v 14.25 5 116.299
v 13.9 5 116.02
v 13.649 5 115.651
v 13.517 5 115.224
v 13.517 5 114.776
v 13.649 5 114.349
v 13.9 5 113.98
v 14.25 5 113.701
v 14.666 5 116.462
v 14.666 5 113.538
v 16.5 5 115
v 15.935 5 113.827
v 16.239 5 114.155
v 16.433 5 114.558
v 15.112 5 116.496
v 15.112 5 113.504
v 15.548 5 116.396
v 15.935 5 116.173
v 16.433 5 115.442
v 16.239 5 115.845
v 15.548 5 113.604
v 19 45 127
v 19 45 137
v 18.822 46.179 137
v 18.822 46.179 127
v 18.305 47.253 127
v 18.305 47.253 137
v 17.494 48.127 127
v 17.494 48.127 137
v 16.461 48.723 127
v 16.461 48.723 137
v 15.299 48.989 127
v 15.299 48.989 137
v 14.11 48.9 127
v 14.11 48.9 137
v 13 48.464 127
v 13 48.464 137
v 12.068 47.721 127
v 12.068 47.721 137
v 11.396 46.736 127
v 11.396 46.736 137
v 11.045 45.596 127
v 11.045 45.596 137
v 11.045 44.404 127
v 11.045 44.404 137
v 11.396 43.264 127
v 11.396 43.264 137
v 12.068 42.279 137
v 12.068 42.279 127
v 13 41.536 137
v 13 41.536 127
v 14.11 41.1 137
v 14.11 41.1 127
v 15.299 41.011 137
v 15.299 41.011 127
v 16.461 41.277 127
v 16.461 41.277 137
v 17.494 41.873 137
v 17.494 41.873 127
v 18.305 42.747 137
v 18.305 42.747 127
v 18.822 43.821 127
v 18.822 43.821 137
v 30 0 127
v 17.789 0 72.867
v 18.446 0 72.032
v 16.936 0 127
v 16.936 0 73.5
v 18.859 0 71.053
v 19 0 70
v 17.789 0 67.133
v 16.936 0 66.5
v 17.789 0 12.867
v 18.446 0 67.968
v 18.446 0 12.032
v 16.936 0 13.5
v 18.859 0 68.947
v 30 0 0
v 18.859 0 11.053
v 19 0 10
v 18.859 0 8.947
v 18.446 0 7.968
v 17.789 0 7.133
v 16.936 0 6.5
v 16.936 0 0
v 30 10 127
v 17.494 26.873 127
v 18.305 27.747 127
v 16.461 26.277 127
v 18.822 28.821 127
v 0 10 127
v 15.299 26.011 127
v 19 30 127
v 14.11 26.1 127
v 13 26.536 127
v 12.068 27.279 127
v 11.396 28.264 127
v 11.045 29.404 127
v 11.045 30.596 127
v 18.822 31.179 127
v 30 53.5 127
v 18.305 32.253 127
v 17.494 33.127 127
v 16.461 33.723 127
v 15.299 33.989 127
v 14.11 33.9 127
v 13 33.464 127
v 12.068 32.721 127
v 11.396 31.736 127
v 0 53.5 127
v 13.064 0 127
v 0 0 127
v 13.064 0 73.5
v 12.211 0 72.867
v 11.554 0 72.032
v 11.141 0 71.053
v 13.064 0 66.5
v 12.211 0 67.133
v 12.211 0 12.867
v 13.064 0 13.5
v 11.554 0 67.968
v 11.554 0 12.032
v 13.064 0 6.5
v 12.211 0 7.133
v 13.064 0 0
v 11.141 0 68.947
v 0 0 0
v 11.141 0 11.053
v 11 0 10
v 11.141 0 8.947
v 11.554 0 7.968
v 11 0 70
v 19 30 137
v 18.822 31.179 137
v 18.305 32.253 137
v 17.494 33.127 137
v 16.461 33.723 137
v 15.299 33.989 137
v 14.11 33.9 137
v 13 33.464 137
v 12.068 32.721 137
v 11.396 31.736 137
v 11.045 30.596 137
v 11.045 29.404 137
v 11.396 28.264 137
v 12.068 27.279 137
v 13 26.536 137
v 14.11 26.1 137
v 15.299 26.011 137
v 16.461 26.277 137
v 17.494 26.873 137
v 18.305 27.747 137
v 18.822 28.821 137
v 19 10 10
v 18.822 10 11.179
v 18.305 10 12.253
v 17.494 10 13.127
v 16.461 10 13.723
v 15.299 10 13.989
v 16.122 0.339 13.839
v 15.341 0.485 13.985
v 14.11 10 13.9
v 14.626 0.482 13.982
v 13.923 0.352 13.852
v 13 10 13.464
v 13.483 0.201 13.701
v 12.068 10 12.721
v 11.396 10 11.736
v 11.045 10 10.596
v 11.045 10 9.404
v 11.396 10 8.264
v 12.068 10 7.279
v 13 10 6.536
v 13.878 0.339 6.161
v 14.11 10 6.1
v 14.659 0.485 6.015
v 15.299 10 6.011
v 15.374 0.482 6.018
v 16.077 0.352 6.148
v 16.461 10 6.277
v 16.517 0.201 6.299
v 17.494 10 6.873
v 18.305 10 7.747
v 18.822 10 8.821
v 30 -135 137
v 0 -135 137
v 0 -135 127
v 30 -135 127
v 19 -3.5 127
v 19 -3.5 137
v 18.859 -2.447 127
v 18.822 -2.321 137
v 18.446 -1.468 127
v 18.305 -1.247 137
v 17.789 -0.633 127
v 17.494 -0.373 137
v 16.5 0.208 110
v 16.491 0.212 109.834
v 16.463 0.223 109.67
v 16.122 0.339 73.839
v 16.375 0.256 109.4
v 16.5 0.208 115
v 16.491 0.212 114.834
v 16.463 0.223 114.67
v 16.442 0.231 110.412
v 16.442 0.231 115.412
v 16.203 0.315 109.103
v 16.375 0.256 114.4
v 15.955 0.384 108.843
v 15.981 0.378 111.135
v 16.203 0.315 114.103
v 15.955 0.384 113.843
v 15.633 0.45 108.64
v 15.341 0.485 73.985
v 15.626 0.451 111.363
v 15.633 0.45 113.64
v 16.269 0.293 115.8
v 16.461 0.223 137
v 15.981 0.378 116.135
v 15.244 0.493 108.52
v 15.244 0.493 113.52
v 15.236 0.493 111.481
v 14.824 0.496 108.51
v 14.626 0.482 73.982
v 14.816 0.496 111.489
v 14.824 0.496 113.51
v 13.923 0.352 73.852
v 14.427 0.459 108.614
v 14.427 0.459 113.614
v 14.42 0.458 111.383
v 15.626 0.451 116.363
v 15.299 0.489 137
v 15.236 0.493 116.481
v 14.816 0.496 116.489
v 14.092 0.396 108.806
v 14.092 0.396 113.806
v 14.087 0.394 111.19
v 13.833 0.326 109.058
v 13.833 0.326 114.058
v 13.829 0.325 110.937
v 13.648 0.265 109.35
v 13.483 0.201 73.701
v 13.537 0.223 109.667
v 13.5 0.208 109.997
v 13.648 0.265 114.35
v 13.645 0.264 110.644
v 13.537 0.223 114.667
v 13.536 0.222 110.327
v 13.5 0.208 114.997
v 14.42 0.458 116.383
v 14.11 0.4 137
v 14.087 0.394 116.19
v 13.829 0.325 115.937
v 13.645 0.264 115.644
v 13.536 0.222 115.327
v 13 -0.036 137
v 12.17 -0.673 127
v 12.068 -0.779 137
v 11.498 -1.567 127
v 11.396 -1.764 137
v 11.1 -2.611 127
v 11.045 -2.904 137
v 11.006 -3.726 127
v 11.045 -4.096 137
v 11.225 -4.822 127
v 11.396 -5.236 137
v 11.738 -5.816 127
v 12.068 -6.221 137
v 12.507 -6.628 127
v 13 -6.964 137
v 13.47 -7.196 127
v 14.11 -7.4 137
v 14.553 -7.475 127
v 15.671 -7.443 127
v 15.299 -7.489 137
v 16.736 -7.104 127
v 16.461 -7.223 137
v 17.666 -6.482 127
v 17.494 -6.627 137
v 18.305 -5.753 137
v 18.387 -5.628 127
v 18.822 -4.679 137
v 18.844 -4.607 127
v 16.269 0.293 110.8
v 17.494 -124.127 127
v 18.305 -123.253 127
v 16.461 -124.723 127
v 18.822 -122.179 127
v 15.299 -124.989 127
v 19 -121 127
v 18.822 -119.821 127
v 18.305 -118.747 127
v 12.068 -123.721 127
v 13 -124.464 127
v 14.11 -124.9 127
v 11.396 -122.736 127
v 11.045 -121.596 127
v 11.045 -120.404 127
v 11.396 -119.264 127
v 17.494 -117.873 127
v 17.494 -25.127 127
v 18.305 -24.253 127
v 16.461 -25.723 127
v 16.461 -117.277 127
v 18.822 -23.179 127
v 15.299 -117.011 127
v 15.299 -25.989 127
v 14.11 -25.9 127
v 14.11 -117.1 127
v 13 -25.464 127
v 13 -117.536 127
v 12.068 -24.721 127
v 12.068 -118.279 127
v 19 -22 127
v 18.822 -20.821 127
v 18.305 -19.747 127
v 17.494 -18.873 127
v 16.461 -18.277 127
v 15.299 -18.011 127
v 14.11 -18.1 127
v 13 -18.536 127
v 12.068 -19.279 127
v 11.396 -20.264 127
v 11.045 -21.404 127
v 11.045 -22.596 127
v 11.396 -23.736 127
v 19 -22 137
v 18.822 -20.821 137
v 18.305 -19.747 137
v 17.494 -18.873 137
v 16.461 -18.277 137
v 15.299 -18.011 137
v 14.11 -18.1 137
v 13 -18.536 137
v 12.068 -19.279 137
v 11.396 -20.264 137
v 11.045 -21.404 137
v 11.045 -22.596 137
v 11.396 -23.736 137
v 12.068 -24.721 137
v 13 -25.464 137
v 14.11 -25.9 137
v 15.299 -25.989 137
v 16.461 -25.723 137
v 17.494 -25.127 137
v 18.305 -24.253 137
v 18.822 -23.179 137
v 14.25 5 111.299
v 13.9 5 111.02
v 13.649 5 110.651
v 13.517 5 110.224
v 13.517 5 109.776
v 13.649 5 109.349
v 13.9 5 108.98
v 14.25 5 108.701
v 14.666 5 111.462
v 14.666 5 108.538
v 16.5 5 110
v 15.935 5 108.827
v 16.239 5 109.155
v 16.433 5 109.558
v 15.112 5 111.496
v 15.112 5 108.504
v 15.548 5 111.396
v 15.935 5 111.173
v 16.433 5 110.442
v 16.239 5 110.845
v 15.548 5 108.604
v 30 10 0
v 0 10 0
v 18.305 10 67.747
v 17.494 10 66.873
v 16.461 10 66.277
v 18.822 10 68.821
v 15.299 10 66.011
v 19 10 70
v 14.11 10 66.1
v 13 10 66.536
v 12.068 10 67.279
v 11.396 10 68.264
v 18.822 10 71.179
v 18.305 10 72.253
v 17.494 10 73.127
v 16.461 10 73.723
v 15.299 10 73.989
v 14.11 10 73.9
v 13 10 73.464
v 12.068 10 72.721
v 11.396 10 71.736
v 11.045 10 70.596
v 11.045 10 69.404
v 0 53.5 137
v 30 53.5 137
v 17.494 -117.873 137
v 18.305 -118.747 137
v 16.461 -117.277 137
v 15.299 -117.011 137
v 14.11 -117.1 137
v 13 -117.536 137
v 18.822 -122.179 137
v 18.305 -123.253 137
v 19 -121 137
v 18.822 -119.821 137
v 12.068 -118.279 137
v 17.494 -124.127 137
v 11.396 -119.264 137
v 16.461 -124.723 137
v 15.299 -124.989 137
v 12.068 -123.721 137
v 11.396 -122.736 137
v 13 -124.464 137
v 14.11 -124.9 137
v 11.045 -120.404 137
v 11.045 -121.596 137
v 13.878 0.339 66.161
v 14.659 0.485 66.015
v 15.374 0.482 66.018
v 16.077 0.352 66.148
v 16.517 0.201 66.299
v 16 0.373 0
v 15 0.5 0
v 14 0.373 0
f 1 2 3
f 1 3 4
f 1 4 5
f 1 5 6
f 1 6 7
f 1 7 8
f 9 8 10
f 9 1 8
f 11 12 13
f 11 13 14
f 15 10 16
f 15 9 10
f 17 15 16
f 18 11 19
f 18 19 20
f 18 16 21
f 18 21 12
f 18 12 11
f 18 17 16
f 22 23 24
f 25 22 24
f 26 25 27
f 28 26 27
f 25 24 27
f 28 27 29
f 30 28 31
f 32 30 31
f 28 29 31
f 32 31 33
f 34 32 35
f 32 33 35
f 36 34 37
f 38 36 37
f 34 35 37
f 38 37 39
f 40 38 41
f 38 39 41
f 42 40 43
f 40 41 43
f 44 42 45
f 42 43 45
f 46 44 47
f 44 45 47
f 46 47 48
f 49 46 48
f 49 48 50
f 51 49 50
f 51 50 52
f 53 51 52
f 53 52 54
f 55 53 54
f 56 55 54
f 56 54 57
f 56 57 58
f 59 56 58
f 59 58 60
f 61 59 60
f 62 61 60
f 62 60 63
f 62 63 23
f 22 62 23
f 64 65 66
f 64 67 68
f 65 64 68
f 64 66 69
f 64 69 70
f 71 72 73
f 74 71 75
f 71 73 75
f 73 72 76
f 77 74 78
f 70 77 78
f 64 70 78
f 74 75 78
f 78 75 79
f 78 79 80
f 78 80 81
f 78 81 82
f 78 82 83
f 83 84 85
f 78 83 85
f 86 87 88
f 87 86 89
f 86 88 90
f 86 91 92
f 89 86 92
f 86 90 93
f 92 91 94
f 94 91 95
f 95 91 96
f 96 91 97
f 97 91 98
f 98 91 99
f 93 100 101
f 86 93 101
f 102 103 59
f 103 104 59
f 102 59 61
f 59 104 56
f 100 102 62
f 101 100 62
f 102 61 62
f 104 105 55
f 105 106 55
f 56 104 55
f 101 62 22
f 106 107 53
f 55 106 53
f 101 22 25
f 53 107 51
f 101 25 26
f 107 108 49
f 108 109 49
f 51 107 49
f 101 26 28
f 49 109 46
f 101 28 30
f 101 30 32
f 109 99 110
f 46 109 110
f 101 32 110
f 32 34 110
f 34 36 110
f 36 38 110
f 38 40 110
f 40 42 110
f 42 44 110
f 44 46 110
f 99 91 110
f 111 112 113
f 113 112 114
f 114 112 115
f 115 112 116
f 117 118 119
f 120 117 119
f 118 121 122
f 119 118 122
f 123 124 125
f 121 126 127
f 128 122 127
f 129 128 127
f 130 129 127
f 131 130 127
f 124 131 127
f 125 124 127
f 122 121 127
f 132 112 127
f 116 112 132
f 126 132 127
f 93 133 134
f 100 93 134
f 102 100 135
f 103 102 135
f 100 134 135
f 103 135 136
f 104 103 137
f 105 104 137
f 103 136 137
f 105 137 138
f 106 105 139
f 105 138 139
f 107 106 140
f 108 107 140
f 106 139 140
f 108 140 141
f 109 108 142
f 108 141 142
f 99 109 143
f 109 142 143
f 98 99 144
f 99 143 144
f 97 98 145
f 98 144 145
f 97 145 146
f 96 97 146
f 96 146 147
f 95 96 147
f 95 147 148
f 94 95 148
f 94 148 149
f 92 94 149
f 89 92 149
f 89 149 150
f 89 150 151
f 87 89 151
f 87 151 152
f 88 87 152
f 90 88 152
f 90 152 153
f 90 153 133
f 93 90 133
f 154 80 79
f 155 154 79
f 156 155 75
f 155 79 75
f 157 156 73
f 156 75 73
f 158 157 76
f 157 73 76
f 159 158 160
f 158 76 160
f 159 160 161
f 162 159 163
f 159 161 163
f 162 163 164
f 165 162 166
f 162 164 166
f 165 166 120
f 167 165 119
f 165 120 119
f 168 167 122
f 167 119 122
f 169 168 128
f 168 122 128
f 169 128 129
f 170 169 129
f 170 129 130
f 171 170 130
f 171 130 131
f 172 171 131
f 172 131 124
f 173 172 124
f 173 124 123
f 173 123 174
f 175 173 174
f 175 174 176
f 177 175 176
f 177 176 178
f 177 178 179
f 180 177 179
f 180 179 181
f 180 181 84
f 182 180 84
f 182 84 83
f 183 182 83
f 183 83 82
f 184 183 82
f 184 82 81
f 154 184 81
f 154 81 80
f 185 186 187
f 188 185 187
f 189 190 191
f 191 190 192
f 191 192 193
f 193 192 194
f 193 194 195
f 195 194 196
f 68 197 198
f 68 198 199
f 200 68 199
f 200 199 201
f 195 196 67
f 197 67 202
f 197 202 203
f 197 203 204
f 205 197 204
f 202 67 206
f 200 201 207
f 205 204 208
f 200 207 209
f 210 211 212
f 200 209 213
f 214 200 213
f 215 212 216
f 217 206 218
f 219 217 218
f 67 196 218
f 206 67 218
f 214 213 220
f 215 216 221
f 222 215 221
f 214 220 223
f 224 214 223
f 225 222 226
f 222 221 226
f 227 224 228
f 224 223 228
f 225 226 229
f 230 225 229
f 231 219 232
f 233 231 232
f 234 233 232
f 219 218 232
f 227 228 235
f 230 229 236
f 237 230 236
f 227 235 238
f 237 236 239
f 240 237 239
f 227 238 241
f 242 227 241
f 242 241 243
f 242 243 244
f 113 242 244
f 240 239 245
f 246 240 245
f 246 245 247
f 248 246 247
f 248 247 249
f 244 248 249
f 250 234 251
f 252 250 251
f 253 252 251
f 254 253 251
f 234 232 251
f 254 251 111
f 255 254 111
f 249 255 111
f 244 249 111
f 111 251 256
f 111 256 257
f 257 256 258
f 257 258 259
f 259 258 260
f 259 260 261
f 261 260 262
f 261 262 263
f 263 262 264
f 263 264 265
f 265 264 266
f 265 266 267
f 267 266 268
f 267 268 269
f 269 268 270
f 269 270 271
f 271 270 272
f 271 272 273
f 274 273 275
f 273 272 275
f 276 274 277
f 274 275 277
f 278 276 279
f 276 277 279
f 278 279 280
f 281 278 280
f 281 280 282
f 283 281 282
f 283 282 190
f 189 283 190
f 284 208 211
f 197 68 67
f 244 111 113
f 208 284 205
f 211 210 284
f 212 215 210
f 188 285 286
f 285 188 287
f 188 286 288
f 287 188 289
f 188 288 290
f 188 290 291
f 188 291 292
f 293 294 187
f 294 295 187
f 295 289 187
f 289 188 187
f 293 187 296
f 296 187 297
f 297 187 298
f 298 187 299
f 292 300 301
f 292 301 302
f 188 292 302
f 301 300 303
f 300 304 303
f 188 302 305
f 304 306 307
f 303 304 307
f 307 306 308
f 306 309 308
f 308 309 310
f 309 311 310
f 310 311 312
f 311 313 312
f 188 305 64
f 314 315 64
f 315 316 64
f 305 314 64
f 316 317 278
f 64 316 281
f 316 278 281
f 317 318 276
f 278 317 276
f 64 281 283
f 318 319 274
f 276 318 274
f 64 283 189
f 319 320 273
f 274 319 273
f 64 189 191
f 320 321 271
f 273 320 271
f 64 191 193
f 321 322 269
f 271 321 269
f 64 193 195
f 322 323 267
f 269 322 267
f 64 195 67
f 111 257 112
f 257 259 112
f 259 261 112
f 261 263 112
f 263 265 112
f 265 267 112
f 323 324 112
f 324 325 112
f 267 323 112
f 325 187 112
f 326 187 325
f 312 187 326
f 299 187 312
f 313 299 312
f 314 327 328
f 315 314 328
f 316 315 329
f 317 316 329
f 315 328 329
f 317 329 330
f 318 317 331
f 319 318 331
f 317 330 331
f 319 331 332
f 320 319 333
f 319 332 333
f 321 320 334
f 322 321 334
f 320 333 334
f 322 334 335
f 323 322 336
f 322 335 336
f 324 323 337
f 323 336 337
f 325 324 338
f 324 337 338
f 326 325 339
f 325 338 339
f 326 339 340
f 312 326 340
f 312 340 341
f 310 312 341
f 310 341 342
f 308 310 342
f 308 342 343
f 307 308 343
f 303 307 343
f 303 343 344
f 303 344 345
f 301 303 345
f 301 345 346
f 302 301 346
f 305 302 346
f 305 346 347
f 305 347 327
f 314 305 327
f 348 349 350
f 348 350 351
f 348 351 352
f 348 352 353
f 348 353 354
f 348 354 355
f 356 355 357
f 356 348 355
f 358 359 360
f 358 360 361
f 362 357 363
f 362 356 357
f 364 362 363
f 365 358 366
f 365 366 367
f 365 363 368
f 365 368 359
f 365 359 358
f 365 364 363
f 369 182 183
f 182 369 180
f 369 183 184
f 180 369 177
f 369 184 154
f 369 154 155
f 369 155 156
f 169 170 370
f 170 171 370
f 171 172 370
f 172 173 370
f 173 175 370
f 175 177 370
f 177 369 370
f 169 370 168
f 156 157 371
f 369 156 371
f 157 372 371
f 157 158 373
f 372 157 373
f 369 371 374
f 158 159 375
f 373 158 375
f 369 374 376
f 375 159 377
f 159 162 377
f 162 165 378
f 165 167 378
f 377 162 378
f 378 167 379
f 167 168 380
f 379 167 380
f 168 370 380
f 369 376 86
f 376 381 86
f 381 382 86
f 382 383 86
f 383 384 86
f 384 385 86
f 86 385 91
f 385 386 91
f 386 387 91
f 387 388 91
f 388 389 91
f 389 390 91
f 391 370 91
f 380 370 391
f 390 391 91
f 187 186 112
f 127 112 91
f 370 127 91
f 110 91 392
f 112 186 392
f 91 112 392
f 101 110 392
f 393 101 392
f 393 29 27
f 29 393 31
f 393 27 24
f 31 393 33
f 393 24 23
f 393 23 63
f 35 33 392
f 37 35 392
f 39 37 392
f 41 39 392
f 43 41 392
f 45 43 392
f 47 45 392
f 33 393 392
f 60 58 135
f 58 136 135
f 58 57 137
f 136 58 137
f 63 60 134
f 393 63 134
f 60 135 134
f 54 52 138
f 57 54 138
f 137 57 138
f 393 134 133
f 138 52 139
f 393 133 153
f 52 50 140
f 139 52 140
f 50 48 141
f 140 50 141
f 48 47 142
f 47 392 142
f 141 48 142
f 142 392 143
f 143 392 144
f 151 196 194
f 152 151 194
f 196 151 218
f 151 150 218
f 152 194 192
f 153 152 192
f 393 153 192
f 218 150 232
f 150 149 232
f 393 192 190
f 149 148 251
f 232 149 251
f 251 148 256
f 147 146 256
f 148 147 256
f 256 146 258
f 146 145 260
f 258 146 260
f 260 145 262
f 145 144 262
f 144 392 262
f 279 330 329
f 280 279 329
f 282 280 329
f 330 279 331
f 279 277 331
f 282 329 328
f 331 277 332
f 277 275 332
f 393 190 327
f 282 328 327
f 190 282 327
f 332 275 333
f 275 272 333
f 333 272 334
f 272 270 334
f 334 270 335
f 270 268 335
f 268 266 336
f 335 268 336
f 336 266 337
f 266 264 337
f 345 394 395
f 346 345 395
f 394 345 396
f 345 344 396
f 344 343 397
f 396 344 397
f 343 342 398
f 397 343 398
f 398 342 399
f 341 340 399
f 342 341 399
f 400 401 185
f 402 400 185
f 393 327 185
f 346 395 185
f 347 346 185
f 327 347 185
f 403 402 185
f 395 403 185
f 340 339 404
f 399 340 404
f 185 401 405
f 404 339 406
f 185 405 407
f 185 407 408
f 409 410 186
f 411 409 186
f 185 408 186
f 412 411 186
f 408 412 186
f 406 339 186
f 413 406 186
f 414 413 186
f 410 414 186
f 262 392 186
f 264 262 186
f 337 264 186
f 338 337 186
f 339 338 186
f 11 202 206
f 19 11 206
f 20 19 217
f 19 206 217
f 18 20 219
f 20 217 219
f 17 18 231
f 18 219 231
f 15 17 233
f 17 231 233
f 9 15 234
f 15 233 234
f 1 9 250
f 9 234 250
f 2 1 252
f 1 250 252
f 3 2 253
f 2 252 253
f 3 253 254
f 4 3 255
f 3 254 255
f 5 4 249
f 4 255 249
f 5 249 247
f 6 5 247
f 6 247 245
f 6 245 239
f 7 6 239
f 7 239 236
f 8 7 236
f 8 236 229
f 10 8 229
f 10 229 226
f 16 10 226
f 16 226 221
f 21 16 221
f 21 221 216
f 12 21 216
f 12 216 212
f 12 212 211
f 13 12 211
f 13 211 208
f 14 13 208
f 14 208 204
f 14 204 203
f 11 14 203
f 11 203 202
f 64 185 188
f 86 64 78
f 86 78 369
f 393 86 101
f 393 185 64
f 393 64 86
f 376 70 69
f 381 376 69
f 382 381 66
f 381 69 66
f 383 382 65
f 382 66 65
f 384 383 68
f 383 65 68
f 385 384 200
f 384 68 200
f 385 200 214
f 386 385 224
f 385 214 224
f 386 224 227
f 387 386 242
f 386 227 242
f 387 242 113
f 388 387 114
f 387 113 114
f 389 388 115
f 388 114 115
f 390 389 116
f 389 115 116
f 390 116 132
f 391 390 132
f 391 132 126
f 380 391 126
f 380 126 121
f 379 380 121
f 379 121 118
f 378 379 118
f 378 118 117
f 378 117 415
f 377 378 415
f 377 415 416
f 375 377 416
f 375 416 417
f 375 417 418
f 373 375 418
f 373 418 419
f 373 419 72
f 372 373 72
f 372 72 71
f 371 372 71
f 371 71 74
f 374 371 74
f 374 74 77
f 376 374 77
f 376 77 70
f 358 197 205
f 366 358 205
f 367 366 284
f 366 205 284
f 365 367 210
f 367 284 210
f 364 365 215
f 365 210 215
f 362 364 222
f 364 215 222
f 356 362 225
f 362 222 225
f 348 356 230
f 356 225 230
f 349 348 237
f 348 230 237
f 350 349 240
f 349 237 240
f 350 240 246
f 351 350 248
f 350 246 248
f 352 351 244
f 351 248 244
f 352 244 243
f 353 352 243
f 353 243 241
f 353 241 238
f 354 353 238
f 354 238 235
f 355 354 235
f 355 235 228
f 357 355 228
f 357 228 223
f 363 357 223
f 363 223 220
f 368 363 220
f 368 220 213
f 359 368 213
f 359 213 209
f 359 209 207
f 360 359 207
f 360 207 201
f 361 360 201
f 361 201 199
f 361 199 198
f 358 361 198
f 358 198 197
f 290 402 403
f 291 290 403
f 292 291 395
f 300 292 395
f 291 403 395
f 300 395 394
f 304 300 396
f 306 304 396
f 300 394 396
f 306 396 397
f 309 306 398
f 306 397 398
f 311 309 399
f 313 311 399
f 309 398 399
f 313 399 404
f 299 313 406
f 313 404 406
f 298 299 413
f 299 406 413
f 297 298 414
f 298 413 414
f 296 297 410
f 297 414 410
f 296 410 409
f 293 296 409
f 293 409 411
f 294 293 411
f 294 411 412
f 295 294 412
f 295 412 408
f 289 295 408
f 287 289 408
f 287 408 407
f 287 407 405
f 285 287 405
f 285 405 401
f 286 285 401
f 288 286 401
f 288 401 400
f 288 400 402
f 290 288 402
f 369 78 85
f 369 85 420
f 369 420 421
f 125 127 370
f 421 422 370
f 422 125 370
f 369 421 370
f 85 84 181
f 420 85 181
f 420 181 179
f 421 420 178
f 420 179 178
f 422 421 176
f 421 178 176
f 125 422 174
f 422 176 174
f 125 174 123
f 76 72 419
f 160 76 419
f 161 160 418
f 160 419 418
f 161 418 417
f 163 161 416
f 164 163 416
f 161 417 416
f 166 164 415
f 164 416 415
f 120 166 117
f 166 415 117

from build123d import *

# Parameters (mm, degrees)
F1_DEPTH = 30
F2_R     = 4
F3_DEPTH = 53.501
F4_R     = 4
F5_DEPTH = 137.001
F6_R     = 1.5
F7_DEPTH = 5


with BuildPart() as f1:
    # F0 (on Right) → F1 (new body)
    with BuildSketch(Plane.YZ):
        Polygon((0, 127), (0, 0), (10, 0), (10, 127), (53.5, 127), (53.5, 137), (-135, 137), (-135, 127), align=None)
    extrude(amount=F1_DEPTH)

    # F2 (on face) → F3 (cut, through all)
    with BuildSketch(Plane.XZ):
        with Locations((15, 70)):
            Circle(F2_R)
        with Locations((15, 10)):
            Circle(F2_R)
    extrude(amount=-F3_DEPTH, mode=Mode.SUBTRACT)

    # F4 (on face) → F5 (cut, through all)
    with BuildSketch(Plane.XY.offset(137)):
        with Locations((15, 45)):
            Circle(F4_R)
        with Locations((15, 30)):
            Circle(F4_R)
        with Locations((15, -3.5)):
            Circle(F4_R)
        with Locations((15, -22)):
            Circle(F4_R)
        with Locations((15, -121)):
            Circle(F4_R)
    extrude(amount=-F5_DEPTH, mode=Mode.SUBTRACT)

    # F6 (on face) → F7 (cut)
    with BuildSketch(Plane.XZ):
        with Locations((15, 110)):
            Circle(F6_R)
        with Locations((15, 115)):
            Circle(F6_R)
    extrude(amount=-F7_DEPTH, mode=Mode.SUBTRACT)


solid = f1.part
